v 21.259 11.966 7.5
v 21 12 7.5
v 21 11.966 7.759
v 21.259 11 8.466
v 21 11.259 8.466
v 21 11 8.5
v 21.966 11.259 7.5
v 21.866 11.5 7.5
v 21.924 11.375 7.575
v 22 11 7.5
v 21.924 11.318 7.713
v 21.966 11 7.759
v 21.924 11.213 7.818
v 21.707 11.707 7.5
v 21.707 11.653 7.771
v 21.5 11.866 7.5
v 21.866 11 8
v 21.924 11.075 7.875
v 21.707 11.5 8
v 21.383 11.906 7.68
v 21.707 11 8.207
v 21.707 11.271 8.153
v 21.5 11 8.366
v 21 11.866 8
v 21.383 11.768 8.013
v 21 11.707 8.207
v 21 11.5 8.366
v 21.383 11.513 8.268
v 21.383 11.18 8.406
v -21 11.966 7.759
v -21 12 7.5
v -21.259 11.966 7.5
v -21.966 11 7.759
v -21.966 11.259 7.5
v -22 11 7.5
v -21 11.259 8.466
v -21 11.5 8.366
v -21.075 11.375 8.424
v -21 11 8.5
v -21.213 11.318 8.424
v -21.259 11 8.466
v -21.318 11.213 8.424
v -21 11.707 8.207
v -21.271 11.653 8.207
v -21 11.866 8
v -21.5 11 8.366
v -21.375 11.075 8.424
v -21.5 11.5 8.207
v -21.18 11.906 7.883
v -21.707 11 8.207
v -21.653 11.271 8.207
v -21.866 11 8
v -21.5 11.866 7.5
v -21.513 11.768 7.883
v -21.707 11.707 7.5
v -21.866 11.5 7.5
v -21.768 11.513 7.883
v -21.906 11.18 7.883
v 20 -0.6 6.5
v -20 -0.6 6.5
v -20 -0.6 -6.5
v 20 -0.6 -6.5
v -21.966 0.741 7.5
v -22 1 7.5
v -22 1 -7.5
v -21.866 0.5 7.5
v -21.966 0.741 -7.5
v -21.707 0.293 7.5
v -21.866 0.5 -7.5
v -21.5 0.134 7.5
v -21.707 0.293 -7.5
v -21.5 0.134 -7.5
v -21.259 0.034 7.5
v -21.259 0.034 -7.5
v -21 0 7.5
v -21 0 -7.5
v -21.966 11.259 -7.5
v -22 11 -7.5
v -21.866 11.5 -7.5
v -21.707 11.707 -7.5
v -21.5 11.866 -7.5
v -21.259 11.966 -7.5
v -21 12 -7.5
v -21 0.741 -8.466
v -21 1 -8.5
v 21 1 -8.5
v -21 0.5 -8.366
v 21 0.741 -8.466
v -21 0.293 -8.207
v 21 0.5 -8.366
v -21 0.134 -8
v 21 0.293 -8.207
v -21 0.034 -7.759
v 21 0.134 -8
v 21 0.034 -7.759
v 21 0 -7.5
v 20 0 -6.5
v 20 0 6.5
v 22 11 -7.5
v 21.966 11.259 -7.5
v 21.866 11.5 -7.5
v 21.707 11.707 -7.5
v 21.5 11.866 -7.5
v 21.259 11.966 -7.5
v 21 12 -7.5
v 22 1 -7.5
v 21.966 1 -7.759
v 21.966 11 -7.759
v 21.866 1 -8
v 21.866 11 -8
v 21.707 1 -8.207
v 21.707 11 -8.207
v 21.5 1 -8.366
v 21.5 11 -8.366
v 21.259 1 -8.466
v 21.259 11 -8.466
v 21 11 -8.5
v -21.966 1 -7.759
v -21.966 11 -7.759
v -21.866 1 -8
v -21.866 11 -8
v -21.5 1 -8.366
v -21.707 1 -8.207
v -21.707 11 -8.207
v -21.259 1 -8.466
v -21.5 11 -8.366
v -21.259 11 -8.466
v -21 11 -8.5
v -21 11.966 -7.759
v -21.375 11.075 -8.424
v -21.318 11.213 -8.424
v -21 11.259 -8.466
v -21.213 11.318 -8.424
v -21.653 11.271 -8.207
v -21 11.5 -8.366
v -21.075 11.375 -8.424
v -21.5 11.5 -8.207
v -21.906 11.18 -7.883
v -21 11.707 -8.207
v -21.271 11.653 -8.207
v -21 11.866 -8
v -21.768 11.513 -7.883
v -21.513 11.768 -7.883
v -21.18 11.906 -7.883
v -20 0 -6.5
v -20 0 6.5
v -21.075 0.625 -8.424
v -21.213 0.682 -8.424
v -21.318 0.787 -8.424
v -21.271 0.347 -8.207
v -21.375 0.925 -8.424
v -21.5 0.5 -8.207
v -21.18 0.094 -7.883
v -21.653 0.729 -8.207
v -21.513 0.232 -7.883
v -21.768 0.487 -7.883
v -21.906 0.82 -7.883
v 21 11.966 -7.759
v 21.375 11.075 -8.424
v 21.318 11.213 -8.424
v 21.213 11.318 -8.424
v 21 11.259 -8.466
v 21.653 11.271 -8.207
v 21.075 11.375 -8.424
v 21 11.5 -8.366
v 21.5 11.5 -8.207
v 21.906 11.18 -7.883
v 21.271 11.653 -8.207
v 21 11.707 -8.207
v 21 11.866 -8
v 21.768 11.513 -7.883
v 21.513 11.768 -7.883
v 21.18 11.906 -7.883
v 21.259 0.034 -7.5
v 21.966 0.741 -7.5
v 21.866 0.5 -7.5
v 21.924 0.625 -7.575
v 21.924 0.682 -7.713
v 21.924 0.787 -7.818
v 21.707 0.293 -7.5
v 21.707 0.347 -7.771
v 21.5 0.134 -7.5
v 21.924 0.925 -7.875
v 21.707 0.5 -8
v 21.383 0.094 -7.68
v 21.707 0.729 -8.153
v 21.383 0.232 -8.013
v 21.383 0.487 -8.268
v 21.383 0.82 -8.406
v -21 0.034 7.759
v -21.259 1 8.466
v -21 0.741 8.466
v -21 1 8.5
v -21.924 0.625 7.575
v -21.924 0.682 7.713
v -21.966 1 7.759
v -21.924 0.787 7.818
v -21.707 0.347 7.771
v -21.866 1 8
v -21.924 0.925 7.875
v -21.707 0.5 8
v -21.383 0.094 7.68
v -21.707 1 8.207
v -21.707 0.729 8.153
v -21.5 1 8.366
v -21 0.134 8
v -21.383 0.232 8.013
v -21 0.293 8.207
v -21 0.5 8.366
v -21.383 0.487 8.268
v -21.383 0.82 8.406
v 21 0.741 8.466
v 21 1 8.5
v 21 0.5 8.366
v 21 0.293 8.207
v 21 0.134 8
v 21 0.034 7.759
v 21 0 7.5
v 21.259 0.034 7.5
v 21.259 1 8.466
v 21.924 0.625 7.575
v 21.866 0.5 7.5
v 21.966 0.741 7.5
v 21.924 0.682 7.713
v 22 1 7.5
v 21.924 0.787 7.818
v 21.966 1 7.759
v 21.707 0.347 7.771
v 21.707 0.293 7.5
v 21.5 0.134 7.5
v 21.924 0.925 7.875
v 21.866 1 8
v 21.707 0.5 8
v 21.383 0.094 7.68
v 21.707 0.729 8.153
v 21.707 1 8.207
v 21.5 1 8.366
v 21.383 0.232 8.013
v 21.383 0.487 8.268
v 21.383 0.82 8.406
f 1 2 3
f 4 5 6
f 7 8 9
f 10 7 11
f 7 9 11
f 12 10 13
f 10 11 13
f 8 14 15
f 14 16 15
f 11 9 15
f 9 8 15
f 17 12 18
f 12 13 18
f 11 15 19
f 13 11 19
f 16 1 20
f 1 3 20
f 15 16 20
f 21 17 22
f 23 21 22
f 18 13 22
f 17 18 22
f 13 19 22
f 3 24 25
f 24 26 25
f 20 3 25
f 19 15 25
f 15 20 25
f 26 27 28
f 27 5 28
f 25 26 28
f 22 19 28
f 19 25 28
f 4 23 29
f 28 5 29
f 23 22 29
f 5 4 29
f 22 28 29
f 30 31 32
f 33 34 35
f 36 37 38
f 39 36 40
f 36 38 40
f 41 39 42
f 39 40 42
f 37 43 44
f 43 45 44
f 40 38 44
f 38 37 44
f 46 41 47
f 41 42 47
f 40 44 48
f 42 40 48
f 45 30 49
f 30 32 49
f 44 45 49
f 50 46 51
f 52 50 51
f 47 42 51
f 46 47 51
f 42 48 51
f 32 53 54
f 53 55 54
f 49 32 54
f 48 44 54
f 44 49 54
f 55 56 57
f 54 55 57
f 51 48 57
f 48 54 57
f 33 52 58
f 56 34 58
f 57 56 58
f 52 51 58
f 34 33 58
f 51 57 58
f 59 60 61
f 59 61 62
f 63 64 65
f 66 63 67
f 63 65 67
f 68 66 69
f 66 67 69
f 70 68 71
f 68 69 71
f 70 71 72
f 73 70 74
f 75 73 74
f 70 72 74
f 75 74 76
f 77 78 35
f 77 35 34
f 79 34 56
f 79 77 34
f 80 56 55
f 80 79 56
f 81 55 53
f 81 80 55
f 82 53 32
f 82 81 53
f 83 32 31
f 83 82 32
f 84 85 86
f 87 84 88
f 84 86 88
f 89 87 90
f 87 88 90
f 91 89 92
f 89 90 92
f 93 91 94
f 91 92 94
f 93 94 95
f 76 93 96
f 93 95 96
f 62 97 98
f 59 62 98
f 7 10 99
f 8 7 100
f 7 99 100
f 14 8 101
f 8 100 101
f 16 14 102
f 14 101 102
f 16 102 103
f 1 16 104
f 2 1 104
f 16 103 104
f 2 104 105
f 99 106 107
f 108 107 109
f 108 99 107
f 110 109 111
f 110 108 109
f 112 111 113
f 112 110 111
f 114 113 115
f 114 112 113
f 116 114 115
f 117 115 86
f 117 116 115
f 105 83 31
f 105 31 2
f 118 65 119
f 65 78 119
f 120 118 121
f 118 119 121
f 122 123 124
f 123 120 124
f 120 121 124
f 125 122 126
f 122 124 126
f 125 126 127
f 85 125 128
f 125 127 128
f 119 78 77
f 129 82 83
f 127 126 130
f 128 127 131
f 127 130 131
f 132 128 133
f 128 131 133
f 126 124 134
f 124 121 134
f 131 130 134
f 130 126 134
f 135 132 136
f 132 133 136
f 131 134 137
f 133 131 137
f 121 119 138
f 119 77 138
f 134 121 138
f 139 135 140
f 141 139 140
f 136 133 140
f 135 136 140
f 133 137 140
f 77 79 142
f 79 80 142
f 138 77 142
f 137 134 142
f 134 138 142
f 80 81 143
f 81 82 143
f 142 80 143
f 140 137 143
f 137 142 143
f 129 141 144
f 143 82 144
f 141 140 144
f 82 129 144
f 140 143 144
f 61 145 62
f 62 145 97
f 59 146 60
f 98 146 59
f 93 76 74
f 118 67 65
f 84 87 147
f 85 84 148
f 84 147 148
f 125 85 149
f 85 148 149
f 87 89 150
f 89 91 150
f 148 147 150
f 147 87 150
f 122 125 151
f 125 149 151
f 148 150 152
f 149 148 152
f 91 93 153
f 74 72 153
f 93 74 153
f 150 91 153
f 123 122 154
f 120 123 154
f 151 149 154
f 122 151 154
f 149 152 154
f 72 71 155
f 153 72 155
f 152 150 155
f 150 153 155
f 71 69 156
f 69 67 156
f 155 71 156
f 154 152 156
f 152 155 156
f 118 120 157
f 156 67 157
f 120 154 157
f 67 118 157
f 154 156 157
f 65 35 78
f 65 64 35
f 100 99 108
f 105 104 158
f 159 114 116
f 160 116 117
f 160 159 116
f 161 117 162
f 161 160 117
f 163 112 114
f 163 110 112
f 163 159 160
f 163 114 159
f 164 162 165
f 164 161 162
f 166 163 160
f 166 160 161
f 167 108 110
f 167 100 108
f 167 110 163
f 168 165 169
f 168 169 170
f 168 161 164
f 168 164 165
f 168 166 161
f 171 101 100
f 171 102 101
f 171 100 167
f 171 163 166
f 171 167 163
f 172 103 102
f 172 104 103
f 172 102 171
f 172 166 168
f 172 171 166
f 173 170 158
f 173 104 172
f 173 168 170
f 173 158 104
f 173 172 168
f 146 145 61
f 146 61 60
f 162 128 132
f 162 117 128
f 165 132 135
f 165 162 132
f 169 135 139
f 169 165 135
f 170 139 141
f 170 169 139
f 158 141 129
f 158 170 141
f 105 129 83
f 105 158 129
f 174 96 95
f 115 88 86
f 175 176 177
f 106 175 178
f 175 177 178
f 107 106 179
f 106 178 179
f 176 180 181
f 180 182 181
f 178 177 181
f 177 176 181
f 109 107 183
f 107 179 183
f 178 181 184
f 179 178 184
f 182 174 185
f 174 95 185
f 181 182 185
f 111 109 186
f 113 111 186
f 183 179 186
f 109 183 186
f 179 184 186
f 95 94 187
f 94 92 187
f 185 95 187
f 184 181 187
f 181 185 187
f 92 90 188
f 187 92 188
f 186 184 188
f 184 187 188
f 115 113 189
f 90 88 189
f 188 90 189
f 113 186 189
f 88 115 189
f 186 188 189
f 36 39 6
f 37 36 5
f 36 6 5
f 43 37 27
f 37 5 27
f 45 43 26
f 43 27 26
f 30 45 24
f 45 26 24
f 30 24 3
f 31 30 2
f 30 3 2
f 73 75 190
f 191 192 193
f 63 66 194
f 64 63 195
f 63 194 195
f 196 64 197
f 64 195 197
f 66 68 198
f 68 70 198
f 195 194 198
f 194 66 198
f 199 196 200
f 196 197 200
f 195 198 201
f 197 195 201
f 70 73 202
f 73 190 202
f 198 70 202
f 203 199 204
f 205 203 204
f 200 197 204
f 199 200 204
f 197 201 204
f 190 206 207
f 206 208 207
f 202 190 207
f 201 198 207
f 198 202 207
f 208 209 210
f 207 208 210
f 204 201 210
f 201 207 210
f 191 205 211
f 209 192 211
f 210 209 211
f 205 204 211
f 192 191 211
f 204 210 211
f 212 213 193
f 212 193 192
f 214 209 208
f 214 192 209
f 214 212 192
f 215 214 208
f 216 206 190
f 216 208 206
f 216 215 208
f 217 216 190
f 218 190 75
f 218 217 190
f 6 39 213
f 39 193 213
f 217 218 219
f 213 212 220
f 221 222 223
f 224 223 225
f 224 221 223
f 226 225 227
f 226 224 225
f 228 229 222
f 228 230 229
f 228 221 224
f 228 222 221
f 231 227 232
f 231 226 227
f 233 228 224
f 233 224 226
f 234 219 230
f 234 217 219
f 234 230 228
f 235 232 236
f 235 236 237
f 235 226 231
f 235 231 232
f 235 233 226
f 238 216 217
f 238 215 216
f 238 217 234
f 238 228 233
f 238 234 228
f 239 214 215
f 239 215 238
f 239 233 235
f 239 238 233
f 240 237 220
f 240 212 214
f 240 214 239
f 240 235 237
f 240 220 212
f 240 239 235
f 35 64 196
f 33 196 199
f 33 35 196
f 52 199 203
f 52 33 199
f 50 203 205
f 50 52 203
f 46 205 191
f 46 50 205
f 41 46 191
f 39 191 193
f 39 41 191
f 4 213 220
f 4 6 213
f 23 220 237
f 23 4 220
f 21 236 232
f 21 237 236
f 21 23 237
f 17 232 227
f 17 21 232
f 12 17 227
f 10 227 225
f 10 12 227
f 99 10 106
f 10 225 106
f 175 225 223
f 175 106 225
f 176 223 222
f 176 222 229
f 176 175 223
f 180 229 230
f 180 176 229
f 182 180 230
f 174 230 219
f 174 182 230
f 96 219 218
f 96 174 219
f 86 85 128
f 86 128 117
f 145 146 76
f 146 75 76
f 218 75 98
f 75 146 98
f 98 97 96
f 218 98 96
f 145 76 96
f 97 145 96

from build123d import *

# Parameters (mm, degrees)
SKETCH1_W           = 44
SKETCH1_H           = 17
BOSS_EXTRUDE1_DEPTH = 12
FILLET1_R           = 1
SKETCH2_W           = 40
SKETCH2_H           = 13
BOSS_EXTRUDE2_DEPTH = 0.6


with BuildPart() as part:
    # Sketch1 → Boss-Extrude1 (new body)
    with BuildSketch(Plane(origin=(0, 0, 0), x_dir=(1, 0, 0), z_dir=(0, 1, 0))):
        Rectangle(SKETCH1_W, SKETCH1_H)
    extrude(amount=BOSS_EXTRUDE1_DEPTH)

    # Fillet1
    fillet1_edges = [part.edges().sort_by_distance(p)[0] for p in [
        (-22, 12, 0),
        (0, 12, 8.5),
        (22, 12, 0),
        (0, 0, 8.5),
        (-22, 0, 0),
        (0, 0, -8.5),
        (22, 0, 0),
        (22, 6, 8.5),
        (-22, 6, 8.5),
        (-22, 6, -8.5),
        (22, 6, -8.5),
        (0, 12, -8.5),
    ]]
    fillet(fillet1_edges, radius=FILLET1_R)

    # Sketch2 → Boss-Extrude2 (add)
    with BuildSketch(Plane.XZ):
        Rectangle(SKETCH2_W, SKETCH2_H)
    extrude(amount=BOSS_EXTRUDE2_DEPTH)


solid = part.part
